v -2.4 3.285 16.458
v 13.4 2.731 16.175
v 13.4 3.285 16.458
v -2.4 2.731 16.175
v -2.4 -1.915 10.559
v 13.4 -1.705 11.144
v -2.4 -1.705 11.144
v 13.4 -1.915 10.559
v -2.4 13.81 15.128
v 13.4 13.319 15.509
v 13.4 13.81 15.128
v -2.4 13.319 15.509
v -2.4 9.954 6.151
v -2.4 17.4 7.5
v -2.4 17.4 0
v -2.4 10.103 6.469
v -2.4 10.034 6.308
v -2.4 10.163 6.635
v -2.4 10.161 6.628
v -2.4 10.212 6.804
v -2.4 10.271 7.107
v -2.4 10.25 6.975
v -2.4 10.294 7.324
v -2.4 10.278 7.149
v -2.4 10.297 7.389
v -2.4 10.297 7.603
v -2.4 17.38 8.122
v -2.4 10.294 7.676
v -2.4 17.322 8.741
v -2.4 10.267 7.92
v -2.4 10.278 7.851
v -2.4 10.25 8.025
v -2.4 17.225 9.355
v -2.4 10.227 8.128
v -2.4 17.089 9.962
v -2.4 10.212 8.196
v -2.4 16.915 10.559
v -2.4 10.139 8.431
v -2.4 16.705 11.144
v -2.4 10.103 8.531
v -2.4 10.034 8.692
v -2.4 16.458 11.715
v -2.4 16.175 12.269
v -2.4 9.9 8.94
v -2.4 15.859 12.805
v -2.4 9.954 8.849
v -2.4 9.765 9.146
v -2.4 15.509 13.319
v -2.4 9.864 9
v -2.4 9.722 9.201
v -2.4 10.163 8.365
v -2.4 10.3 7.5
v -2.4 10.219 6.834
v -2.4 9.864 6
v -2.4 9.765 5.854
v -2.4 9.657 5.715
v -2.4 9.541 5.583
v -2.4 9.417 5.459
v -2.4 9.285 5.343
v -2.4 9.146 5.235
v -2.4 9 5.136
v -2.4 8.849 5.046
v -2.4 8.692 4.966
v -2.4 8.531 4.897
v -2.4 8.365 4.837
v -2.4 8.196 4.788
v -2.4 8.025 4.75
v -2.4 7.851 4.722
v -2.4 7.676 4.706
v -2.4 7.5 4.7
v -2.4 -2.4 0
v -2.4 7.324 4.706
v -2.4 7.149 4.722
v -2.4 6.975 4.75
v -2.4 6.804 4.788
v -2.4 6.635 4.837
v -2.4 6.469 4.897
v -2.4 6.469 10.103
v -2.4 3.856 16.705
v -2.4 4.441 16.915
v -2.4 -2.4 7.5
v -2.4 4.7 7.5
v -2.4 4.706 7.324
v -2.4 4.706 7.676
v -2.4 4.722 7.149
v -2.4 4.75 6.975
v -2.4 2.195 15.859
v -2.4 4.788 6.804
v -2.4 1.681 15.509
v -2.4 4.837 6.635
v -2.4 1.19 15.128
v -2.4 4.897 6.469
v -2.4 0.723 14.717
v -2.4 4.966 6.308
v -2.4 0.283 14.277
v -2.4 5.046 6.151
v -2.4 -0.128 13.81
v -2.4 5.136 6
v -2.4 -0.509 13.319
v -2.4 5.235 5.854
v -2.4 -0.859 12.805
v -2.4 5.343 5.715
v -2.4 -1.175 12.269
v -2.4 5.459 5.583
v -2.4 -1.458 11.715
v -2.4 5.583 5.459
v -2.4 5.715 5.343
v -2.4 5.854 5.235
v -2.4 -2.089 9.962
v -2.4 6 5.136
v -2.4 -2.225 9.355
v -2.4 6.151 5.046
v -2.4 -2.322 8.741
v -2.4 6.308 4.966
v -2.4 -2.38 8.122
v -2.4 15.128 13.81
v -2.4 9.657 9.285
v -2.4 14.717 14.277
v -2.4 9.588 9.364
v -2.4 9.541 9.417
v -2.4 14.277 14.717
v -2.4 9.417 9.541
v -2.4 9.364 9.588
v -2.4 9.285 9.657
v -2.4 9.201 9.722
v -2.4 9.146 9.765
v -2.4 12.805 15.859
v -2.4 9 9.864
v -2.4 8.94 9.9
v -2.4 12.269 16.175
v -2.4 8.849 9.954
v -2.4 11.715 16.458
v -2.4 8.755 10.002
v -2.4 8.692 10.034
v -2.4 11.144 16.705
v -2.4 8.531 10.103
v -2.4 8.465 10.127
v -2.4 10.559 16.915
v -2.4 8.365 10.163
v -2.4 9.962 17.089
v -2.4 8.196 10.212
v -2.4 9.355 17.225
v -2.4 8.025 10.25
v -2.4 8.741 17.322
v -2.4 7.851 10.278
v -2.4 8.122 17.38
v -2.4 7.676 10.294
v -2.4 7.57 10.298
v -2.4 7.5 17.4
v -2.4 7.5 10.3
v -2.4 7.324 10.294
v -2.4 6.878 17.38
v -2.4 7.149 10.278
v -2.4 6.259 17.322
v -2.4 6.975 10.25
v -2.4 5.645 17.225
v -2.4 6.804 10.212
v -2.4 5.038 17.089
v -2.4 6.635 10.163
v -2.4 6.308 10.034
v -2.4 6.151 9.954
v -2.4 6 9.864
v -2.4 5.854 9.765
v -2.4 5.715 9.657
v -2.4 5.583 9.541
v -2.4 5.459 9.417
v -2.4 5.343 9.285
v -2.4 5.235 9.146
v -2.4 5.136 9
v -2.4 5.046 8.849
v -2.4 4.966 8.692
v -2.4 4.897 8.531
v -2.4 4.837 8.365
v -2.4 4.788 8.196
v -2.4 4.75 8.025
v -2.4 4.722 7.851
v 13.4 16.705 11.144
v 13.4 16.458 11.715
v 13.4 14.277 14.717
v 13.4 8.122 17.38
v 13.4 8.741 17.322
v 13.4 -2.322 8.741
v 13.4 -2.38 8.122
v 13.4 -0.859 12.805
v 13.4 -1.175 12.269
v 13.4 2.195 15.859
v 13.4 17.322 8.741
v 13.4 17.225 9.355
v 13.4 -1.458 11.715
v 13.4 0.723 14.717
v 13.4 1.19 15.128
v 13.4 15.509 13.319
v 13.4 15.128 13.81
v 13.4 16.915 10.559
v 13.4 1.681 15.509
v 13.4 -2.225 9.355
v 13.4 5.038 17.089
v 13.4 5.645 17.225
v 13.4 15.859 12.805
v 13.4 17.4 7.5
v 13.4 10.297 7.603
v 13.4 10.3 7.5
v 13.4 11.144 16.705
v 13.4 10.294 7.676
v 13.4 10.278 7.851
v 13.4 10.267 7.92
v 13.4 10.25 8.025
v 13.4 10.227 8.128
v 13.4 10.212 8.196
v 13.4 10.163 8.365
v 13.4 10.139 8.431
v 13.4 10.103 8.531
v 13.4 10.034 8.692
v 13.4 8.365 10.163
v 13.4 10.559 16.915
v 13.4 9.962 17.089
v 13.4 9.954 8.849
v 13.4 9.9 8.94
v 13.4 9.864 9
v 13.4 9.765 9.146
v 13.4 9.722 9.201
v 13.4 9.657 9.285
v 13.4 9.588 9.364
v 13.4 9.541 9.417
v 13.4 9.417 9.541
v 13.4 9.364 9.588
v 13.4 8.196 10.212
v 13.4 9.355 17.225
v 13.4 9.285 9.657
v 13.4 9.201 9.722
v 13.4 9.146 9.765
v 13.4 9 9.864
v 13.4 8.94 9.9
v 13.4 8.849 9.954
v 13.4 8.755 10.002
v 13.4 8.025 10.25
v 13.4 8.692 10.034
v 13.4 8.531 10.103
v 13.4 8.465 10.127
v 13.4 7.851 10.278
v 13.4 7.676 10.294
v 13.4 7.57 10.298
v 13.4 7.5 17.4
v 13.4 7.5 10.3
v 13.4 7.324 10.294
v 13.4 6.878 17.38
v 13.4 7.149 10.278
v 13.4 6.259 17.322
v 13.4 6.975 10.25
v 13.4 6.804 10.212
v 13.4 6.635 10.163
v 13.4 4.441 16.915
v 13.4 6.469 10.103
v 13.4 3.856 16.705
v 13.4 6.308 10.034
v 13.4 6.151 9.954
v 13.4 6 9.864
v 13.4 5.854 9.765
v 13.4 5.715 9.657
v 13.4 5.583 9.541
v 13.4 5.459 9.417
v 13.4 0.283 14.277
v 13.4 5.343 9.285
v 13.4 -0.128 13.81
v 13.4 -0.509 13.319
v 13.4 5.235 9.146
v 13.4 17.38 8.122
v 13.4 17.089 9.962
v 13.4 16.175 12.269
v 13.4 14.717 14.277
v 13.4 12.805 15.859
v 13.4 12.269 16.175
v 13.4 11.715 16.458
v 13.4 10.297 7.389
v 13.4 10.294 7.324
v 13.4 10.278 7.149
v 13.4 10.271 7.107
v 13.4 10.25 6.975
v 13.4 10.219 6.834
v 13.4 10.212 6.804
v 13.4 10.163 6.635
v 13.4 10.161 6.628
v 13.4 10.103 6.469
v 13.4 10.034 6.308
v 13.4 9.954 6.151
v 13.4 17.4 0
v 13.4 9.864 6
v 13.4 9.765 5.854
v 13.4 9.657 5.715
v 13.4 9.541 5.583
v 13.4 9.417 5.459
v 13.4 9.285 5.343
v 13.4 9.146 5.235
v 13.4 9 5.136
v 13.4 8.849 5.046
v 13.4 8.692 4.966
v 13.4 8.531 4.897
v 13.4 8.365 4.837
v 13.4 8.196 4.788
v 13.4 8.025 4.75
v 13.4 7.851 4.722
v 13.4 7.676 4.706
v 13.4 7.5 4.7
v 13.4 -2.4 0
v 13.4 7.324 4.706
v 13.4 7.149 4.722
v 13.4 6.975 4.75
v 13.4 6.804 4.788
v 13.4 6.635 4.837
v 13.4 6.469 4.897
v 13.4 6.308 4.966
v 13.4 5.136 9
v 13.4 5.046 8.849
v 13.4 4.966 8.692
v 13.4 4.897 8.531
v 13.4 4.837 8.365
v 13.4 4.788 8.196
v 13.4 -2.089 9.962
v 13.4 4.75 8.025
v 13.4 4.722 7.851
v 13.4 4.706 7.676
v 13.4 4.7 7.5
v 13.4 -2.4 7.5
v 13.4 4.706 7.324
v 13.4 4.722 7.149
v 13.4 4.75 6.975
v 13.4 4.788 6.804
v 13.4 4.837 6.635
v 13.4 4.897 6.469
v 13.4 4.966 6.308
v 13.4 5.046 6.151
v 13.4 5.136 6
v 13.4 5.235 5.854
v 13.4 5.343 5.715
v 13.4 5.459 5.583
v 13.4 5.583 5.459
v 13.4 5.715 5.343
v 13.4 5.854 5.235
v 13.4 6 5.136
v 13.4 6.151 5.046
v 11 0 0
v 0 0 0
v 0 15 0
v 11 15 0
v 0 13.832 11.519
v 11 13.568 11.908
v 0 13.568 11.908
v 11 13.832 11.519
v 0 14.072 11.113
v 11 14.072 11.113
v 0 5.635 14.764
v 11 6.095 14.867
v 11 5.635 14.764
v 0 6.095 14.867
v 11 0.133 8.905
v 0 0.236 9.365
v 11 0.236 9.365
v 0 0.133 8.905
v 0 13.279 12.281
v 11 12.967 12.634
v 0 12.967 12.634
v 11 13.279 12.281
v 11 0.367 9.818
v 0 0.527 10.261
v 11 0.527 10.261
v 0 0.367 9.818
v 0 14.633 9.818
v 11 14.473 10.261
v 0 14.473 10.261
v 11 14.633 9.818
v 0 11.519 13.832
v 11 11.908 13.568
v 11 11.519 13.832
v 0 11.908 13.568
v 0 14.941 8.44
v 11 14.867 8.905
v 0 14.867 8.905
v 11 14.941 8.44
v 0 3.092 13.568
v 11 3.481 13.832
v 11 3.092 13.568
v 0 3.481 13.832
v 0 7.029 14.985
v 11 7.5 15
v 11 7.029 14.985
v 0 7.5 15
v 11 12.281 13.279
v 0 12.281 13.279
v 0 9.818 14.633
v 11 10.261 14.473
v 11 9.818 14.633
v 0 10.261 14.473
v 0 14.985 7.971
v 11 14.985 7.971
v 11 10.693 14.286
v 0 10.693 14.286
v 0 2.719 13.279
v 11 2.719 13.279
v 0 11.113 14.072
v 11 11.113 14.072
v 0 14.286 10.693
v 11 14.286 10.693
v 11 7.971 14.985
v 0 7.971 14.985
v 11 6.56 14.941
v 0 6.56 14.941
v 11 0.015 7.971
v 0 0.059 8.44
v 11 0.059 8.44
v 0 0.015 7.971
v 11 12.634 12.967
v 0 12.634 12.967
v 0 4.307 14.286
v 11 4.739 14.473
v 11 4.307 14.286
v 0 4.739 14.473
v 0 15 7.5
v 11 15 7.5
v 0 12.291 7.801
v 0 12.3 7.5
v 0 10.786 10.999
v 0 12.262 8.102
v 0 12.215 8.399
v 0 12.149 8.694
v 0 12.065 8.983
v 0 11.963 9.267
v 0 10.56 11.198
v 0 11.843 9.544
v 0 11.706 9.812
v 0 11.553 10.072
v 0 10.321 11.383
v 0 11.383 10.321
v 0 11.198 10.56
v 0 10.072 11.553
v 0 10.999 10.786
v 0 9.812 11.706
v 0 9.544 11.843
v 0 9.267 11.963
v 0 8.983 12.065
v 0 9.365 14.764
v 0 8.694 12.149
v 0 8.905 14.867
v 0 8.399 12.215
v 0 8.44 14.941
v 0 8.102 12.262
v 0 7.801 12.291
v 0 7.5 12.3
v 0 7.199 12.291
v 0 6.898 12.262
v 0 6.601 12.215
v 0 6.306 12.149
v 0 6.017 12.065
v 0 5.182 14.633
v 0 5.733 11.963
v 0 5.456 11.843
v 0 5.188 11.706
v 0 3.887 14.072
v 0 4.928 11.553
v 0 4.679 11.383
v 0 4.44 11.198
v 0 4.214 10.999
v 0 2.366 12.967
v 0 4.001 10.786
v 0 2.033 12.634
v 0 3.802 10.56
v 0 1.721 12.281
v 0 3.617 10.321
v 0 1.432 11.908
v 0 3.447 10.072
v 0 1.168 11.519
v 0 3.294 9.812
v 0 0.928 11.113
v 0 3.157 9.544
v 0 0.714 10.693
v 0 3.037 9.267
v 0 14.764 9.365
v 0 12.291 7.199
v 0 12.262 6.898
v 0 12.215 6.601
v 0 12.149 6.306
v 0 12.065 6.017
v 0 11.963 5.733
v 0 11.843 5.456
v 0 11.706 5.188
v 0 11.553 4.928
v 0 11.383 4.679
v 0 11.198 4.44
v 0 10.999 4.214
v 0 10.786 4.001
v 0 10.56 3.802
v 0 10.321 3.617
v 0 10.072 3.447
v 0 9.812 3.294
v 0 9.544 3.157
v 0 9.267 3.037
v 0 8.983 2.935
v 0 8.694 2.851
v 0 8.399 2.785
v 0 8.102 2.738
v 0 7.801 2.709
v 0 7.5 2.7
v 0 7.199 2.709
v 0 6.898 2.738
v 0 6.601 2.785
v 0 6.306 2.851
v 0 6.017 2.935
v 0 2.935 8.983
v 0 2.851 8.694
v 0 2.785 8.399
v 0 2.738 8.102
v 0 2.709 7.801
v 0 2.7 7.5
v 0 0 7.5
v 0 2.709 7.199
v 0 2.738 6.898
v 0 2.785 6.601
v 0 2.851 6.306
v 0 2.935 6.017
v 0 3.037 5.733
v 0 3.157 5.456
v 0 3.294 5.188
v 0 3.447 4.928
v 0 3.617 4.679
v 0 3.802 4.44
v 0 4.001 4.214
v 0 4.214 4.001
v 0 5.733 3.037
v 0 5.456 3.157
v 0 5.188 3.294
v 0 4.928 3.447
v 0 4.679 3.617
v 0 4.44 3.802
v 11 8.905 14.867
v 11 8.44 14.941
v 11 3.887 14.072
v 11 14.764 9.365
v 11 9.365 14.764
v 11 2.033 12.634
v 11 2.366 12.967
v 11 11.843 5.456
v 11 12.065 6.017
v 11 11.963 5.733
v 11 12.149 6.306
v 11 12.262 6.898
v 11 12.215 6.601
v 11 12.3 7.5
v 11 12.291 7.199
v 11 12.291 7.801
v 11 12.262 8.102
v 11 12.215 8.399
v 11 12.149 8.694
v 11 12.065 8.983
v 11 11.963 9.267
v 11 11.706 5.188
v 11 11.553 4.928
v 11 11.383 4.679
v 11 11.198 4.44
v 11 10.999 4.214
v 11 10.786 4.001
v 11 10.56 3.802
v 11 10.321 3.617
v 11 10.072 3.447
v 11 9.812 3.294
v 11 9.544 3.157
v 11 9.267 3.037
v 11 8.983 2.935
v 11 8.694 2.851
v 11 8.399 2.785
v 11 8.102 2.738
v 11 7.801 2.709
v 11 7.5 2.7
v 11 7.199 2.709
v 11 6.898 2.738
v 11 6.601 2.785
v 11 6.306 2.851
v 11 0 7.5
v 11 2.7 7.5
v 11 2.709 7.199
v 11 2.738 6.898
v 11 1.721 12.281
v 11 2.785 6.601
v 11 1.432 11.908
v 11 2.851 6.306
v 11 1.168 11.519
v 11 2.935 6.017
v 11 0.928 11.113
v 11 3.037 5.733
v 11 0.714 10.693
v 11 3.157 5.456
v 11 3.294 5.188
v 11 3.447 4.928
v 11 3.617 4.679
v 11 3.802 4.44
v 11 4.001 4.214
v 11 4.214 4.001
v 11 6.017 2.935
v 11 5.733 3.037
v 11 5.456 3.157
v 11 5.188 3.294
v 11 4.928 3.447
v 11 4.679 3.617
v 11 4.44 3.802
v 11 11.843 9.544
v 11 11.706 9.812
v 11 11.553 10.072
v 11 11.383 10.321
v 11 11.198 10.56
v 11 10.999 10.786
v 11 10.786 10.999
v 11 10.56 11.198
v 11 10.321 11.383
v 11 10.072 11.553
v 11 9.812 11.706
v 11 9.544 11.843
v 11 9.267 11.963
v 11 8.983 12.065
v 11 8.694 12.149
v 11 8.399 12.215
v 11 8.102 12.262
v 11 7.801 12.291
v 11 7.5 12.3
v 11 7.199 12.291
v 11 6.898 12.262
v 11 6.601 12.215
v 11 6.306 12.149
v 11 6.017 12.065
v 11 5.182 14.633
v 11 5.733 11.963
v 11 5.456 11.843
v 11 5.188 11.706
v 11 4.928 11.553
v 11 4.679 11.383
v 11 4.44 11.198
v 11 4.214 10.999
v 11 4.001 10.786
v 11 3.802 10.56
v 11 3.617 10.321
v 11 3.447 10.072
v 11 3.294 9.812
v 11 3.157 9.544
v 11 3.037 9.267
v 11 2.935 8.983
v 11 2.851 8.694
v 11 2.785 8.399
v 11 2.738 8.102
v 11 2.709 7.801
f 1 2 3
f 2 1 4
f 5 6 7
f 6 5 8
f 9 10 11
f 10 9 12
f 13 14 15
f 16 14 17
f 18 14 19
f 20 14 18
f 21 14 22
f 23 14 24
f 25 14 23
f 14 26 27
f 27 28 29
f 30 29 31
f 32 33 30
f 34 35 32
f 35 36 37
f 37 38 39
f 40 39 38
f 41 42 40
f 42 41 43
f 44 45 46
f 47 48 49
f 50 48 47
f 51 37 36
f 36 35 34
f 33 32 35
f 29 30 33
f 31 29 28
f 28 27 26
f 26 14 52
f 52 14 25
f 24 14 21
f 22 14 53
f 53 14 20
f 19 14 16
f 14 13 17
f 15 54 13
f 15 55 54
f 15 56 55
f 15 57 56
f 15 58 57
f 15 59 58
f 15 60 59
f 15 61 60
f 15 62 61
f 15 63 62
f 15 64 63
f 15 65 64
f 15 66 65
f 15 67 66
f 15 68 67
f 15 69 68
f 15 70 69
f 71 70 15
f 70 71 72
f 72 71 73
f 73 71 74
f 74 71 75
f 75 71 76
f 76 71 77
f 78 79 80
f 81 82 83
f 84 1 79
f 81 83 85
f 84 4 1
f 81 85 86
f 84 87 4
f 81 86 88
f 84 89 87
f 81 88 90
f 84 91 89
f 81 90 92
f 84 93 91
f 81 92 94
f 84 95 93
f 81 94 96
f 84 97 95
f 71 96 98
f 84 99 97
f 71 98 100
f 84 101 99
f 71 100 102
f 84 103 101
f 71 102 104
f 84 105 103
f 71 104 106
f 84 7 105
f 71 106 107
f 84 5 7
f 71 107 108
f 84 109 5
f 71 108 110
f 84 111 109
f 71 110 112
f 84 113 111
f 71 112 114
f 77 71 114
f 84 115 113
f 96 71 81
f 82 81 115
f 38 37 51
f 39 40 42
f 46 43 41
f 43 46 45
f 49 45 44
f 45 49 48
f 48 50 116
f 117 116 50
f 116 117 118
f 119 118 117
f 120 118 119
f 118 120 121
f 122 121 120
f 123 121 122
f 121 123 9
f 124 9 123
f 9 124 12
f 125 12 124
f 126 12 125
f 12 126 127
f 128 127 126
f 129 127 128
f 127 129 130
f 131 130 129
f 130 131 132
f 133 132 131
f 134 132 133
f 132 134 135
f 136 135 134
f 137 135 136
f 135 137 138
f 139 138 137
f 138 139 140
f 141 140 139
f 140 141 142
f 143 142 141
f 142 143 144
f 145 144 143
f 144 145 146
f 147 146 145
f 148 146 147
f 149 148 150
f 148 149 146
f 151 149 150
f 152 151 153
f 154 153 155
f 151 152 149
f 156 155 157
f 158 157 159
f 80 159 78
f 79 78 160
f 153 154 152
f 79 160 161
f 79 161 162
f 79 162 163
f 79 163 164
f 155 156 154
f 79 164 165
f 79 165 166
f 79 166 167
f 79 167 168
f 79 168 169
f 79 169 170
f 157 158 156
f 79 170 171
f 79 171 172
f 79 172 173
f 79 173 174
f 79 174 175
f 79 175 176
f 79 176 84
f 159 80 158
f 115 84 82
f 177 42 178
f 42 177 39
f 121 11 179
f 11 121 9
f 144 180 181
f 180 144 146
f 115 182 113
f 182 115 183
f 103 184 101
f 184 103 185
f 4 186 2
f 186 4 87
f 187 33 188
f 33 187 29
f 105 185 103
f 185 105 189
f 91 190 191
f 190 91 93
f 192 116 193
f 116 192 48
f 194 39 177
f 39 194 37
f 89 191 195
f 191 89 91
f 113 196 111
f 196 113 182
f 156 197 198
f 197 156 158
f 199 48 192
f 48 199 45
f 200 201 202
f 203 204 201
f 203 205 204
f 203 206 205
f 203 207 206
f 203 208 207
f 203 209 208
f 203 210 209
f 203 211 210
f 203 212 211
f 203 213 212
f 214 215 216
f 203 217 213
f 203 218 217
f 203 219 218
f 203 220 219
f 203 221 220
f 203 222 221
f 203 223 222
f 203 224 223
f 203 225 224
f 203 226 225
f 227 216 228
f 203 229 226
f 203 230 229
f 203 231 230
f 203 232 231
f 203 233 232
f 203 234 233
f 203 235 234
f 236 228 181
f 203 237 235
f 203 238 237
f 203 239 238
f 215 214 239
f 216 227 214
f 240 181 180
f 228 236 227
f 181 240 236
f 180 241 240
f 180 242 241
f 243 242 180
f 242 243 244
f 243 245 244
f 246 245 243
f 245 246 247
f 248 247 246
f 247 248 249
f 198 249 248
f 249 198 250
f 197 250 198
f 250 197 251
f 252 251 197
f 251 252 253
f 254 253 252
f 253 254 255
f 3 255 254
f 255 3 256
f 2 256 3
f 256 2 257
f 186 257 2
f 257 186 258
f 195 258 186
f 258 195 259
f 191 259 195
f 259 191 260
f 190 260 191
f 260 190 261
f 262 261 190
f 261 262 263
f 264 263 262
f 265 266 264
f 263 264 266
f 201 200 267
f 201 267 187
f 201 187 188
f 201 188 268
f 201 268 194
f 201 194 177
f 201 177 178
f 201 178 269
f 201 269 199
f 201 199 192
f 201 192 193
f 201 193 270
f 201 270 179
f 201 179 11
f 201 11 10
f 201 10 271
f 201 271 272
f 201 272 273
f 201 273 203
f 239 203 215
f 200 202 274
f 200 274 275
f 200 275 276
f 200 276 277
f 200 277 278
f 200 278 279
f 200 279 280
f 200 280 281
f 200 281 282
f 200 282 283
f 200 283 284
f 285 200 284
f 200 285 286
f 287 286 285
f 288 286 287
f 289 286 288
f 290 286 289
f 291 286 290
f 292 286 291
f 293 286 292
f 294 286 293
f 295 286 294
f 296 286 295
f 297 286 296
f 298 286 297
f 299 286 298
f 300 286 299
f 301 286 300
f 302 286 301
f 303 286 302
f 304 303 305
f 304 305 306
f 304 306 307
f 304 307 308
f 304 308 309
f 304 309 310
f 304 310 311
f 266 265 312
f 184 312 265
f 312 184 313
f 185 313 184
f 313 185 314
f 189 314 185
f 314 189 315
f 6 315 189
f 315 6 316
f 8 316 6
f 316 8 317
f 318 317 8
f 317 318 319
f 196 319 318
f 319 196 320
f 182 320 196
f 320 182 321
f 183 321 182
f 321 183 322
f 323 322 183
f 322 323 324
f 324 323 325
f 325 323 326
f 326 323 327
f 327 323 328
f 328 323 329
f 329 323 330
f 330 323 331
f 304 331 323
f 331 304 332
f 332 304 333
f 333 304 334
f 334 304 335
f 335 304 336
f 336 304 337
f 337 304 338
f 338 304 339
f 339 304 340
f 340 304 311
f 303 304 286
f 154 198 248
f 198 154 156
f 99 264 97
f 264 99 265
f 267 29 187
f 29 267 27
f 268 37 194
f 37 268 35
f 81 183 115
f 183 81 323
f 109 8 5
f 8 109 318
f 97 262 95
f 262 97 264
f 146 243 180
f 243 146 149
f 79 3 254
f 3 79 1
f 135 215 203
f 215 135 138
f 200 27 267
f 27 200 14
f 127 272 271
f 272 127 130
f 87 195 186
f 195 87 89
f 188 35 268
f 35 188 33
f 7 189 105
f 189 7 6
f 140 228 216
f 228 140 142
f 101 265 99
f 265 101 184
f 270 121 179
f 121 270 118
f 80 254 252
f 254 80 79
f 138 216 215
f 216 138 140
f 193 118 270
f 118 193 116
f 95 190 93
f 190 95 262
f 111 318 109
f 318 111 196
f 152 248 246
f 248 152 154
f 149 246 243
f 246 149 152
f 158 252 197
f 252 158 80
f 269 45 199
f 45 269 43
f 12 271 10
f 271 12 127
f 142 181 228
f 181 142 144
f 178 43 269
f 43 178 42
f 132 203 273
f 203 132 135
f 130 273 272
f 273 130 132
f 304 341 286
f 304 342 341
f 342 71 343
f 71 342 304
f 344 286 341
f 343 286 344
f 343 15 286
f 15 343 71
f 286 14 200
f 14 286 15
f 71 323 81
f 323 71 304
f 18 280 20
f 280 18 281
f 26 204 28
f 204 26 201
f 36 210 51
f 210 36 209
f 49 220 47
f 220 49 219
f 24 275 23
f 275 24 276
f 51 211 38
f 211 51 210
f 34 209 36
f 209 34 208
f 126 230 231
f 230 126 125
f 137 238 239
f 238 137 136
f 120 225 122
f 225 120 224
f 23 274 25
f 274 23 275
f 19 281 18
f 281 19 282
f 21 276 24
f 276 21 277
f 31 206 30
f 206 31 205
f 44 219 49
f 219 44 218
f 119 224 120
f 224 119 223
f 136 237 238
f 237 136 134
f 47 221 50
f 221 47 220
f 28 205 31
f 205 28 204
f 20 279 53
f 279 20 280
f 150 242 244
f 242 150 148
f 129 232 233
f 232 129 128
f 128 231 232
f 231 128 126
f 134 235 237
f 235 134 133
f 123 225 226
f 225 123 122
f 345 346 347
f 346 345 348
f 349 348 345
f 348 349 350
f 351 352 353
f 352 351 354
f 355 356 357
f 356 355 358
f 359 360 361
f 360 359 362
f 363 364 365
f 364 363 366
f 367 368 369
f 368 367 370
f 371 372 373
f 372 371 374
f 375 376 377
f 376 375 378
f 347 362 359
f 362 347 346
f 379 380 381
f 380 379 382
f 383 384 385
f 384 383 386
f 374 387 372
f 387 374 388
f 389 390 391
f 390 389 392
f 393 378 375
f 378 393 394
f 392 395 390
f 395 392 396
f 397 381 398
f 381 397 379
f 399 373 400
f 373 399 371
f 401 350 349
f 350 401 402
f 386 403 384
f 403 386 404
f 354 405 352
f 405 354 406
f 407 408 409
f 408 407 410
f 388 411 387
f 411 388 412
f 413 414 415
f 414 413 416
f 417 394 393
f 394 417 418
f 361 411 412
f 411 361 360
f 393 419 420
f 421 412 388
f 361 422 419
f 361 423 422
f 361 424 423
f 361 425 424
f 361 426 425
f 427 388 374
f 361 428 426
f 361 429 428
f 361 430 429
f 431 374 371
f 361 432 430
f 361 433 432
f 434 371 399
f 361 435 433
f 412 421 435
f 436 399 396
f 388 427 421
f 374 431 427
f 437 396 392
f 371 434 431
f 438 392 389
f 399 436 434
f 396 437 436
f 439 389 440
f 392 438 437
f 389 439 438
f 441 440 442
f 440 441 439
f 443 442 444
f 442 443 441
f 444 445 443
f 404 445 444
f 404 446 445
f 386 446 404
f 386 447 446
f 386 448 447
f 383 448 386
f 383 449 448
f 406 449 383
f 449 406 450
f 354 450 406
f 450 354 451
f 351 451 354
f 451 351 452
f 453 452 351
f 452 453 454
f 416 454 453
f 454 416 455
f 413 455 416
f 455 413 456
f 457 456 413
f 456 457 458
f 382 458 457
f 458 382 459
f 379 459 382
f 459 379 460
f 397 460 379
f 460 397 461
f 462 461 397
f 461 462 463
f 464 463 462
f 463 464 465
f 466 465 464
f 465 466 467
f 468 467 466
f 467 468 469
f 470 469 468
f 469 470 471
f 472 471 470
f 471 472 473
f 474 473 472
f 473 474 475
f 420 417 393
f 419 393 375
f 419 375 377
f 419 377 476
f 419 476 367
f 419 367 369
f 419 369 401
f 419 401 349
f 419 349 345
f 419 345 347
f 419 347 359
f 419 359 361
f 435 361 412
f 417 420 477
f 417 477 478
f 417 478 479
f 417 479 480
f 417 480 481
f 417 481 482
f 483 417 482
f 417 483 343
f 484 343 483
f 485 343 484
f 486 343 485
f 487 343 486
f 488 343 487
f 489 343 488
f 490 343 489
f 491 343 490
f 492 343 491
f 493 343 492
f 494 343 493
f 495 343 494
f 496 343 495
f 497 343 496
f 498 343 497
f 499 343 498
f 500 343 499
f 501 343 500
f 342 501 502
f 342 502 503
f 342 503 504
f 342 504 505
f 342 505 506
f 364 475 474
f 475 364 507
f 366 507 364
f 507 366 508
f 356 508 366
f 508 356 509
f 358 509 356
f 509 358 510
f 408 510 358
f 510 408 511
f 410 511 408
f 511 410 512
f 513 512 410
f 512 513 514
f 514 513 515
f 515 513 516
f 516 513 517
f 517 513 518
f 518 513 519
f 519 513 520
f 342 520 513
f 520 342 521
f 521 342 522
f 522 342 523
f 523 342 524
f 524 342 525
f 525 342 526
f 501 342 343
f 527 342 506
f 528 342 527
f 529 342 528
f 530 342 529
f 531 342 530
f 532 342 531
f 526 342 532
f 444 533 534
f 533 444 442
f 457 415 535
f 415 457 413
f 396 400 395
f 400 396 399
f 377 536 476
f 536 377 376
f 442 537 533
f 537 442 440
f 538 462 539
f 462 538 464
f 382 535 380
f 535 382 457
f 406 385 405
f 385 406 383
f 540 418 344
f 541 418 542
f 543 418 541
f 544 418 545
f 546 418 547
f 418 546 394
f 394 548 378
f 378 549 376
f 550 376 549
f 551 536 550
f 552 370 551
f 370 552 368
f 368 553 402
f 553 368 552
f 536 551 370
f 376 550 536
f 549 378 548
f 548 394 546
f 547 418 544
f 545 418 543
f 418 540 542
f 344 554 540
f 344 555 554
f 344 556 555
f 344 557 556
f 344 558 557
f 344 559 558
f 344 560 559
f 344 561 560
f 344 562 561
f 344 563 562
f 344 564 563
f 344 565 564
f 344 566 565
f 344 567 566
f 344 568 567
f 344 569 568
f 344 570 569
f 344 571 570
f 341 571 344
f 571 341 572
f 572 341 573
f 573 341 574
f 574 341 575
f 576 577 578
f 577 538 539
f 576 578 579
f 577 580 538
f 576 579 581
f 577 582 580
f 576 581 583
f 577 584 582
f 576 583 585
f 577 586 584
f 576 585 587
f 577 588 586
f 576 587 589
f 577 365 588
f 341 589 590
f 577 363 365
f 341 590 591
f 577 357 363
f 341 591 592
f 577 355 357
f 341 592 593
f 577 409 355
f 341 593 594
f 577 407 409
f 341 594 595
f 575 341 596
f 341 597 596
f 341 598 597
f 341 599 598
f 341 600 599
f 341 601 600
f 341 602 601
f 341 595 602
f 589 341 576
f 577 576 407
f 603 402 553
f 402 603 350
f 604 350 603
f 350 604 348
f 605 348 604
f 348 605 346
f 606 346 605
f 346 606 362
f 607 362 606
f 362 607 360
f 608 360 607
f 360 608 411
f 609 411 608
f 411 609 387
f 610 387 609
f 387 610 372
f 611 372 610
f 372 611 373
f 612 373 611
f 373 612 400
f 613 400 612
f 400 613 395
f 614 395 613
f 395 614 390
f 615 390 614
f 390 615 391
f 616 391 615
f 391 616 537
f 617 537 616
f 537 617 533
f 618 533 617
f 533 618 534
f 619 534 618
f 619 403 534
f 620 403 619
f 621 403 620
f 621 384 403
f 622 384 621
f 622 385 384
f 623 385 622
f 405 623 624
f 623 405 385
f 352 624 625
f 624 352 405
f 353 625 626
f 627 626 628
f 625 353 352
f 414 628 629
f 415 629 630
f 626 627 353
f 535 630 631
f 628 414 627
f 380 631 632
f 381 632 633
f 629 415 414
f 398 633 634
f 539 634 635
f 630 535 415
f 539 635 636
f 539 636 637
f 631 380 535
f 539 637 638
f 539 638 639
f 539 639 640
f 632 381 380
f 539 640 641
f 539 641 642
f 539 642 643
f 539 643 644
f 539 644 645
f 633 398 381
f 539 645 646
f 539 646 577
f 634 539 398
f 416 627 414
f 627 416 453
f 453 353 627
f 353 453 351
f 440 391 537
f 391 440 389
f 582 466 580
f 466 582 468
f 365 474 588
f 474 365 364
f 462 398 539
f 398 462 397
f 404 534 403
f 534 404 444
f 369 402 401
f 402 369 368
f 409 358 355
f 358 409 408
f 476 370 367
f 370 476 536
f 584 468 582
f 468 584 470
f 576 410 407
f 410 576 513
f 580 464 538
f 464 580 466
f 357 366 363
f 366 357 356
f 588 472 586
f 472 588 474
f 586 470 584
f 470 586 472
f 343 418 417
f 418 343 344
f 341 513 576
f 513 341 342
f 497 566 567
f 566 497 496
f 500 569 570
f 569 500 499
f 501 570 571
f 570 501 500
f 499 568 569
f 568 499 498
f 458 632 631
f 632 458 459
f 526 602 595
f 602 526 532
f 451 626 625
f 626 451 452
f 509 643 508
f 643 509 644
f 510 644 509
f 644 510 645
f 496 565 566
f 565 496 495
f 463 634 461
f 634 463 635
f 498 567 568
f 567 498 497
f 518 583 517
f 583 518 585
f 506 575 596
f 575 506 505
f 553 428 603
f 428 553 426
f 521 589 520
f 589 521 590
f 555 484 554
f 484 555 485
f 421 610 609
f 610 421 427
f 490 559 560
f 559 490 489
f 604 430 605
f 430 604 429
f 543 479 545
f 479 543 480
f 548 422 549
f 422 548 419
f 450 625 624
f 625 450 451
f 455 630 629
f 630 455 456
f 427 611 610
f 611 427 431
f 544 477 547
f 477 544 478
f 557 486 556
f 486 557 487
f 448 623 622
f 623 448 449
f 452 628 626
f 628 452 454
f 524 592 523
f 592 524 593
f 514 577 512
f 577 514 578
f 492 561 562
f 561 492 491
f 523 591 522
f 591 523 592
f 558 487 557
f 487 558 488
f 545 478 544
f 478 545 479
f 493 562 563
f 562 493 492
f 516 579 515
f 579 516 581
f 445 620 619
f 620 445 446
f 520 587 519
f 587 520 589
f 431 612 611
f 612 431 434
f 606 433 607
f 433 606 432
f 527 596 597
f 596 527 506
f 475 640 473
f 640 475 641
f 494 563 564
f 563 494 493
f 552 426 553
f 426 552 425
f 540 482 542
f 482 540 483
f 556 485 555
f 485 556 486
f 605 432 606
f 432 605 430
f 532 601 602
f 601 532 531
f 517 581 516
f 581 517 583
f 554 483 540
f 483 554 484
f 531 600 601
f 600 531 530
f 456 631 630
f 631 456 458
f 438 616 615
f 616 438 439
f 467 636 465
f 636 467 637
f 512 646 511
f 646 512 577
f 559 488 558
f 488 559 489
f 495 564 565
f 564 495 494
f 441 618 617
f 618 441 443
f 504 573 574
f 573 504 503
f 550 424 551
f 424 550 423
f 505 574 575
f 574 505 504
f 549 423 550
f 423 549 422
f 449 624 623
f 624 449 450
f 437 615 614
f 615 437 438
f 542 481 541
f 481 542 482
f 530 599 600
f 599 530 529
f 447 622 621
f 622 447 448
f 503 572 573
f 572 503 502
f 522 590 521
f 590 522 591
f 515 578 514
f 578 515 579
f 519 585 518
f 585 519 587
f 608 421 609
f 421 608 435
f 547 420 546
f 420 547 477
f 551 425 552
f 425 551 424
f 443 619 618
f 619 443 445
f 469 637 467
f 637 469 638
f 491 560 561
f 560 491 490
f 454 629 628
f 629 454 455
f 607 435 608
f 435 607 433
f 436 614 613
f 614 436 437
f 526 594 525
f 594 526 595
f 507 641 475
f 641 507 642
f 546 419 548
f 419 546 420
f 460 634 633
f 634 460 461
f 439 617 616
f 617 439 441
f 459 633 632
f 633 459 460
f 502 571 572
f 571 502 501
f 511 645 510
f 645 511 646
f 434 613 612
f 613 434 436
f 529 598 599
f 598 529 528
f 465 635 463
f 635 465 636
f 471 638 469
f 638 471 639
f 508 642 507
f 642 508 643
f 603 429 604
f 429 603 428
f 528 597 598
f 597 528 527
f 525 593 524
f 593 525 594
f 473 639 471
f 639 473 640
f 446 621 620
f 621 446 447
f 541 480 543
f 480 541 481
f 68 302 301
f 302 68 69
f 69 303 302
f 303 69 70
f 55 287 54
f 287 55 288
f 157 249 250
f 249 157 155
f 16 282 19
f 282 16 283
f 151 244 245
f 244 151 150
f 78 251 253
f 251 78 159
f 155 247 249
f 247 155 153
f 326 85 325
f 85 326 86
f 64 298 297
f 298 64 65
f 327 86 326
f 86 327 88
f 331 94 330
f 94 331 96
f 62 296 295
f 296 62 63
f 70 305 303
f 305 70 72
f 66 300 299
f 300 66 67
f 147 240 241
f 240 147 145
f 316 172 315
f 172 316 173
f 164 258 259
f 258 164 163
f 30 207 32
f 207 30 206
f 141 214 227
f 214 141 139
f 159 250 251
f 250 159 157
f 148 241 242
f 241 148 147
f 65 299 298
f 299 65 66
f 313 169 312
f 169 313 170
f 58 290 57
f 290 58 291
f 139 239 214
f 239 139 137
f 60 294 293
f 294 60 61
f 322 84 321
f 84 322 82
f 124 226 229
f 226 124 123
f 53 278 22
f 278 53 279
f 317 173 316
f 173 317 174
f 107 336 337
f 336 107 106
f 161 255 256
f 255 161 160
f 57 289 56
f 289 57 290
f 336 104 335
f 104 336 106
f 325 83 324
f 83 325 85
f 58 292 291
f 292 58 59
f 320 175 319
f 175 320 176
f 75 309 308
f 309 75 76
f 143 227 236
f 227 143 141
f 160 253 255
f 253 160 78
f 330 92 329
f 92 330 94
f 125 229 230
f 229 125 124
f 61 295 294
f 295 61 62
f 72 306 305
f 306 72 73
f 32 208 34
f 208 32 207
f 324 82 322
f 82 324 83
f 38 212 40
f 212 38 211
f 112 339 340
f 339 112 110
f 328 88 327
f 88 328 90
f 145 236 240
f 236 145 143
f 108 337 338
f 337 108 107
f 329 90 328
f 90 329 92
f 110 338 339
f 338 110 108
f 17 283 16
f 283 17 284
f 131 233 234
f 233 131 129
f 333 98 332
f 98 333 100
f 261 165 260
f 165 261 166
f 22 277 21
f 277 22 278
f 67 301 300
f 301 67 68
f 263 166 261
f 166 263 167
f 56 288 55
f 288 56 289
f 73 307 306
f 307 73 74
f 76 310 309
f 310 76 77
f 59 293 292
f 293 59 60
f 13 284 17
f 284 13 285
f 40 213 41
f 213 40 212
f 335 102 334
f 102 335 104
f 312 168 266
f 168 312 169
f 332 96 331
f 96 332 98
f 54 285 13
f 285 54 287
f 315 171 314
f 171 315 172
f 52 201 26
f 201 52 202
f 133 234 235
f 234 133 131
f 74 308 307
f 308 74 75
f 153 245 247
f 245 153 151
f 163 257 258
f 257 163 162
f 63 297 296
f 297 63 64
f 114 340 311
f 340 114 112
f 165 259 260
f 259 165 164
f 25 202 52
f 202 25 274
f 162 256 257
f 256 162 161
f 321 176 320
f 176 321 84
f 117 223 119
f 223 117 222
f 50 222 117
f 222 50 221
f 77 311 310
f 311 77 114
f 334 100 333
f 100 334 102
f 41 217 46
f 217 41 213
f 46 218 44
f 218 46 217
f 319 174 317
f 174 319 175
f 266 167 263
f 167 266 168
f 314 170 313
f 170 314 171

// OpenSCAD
X1 = 11;
Y1 = 15;
Z1 = 15;

$fn=100;

s = 5.6; //scred diam
module xxx(x,y,z){
    
    difference(){
    intersection(){
        union(){
            translate([0,y/2,z-y/2]) rotate([0,90,0])  cylinder(d=y,h=x);
            cube([x,y,z-y/2]);
        }
        cube([x,y,z]); // majes sure it doesnt fall outside the bounds
    }

    translate([0,y/2,z-y/2]) rotate([0,90,0])  cylinder(d=s,h=x);
    }
}



px = 2.4;
py=2.4;
pz=2.4;

OX=X1+2*px;
OY = Y1+2*py;
OZ = Z1+pz;

//difference(){ 
    
  
    
    difference(){
        translate([-px,-py,0]) xxx(OX,OY,OZ);
        xxx(X1,Y1,Z1);
    }

    
    translate([-px,OY/2-py,OZ-OY/2]) rotate([0,90,0])  
    difference() {
        cylinder(d=s+4,h=OX);
        cylinder(d=s,h=OX);
    }
//}
    
